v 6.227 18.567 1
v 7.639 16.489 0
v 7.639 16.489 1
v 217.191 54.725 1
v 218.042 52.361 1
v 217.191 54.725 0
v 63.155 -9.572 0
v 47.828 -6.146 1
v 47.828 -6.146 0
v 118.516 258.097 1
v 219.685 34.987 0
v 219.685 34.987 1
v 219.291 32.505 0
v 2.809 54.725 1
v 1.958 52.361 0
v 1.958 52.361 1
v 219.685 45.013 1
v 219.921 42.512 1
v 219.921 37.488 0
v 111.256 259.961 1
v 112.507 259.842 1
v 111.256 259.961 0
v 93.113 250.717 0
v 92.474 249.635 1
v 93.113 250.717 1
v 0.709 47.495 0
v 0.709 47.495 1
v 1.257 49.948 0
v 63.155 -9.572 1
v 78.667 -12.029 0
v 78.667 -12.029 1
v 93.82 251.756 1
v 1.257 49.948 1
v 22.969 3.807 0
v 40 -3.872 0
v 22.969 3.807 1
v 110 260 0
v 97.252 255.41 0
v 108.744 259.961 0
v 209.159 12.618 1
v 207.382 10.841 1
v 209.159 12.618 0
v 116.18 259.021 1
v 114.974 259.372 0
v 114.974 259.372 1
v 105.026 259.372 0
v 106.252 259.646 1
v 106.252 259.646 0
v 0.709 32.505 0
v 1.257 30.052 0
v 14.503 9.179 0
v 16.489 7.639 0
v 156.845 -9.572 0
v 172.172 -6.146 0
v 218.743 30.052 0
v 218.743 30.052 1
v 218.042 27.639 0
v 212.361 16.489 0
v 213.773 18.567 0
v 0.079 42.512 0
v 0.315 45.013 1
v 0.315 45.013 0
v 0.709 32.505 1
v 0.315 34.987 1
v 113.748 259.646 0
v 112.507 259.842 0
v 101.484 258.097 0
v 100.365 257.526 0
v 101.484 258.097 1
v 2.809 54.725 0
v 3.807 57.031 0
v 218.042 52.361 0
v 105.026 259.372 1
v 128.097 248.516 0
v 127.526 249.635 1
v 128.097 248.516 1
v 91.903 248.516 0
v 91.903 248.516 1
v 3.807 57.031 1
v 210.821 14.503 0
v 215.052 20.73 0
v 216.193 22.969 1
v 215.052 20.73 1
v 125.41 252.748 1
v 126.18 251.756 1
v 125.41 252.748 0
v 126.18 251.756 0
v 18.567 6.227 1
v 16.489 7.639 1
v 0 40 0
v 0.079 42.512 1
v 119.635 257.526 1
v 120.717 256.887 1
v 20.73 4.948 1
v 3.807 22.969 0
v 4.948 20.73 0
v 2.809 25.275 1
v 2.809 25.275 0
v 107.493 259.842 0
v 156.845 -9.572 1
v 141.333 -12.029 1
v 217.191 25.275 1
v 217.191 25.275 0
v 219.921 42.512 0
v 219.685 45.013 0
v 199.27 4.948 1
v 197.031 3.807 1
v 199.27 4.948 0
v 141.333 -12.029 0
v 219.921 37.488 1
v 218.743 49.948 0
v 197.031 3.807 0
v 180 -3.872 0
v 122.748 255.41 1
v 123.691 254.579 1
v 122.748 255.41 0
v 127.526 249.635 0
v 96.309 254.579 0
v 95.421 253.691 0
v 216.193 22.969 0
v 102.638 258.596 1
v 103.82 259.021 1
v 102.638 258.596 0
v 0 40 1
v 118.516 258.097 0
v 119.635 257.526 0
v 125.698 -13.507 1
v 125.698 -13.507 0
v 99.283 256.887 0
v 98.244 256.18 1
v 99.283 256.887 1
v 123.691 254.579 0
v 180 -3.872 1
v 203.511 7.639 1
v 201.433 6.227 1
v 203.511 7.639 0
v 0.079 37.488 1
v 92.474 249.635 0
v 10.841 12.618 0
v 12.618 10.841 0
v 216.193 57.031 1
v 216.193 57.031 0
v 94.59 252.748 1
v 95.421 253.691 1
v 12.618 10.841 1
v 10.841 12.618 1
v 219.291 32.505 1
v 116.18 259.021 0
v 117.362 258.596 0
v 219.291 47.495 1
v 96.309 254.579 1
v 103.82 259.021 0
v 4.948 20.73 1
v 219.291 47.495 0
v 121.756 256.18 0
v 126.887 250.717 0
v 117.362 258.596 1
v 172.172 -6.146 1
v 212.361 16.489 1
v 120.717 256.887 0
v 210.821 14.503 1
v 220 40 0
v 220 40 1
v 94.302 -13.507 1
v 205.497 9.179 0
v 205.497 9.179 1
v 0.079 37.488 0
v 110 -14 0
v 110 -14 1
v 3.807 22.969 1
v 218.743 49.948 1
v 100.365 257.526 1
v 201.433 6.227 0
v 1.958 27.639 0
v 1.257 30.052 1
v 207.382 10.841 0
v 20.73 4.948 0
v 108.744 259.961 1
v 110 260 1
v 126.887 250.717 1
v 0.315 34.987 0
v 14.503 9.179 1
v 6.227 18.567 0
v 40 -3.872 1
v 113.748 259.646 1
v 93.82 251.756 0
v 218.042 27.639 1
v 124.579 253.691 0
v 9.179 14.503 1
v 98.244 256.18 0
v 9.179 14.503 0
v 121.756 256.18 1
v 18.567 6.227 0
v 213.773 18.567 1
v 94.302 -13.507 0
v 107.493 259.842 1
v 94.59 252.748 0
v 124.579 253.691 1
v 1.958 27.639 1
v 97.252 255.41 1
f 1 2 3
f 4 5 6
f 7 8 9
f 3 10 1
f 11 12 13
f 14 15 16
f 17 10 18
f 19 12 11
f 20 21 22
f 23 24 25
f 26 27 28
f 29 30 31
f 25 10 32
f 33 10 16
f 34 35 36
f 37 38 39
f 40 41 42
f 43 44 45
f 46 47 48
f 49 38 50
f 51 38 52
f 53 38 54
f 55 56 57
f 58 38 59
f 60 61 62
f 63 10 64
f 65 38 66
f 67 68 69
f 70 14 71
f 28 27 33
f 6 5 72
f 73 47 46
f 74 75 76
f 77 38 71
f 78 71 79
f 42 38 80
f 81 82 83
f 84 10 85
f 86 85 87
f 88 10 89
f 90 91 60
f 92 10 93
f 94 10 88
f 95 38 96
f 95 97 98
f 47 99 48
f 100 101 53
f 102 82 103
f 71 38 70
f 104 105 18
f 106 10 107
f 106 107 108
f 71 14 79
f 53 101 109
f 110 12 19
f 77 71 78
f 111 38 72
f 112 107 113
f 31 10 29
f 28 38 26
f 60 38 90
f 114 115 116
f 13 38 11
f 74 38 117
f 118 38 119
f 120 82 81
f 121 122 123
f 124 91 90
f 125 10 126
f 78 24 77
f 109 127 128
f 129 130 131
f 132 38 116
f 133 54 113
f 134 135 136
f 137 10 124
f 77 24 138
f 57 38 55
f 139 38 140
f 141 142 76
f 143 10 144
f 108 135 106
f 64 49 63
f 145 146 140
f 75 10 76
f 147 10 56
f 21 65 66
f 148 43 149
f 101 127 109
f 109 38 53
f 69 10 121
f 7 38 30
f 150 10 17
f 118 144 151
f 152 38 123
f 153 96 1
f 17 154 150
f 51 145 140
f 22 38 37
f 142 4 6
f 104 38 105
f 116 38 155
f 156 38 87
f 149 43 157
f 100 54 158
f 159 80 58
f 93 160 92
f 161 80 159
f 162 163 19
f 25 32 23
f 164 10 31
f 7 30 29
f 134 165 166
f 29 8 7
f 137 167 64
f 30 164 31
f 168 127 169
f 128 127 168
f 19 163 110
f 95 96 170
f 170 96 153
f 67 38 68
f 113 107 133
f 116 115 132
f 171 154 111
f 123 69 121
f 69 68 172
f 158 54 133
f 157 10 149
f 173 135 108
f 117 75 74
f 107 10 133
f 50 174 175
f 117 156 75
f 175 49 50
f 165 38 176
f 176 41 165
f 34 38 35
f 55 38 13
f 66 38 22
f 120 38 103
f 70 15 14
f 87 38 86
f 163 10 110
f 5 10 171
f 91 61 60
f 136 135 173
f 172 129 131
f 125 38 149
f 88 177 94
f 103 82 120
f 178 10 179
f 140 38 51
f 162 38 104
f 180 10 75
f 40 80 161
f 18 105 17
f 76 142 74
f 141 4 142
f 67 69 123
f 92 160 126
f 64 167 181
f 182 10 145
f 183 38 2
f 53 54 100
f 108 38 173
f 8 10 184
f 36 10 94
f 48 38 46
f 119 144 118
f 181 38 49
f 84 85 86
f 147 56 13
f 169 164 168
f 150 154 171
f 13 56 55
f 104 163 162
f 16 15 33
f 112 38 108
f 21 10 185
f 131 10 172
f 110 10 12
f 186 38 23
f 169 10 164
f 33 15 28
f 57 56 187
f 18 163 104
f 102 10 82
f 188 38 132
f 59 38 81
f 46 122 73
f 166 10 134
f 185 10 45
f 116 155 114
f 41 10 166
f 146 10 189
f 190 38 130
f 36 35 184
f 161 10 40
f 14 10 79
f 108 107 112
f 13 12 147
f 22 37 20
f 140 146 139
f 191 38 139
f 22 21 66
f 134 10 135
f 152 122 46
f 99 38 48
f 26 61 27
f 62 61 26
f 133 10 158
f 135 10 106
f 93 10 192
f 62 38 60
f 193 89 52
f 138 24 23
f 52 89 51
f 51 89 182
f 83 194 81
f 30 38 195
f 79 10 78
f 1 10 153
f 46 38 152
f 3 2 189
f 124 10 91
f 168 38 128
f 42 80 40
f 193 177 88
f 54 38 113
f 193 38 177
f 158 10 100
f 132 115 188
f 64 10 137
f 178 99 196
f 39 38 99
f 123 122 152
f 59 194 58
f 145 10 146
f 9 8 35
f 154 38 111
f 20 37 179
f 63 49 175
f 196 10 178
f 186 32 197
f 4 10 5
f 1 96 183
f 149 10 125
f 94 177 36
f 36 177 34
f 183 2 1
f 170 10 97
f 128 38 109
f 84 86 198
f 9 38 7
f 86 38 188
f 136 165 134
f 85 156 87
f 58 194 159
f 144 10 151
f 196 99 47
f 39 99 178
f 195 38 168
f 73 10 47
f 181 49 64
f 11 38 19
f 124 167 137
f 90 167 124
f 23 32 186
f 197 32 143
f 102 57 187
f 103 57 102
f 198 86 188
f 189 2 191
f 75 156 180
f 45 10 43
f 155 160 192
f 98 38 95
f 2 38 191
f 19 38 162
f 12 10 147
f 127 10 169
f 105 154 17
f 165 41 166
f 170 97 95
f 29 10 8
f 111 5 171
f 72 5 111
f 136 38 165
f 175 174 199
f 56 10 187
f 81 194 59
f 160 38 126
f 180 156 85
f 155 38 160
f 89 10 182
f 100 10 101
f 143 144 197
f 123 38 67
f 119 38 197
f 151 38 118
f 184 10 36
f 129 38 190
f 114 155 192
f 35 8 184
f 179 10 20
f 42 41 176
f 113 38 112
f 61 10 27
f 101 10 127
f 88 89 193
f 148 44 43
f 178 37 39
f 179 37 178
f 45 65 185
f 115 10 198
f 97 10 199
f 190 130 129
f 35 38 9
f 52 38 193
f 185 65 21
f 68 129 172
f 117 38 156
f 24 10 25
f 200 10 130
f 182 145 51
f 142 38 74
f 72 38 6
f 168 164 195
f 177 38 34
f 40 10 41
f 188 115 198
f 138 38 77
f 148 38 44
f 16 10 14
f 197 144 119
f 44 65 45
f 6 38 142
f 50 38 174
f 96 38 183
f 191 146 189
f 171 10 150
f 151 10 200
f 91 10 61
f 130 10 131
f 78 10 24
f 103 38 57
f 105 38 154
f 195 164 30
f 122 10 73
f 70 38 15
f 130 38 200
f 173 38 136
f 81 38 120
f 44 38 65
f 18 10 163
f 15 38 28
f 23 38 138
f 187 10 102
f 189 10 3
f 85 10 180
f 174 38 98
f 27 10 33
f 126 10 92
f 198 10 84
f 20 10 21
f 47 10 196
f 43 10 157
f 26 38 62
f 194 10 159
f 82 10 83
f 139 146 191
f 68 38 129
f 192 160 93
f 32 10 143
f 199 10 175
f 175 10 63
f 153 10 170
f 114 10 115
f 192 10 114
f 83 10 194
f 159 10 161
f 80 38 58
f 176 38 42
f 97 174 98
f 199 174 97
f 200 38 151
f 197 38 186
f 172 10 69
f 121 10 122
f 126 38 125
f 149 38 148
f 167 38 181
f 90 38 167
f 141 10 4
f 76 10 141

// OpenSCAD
// preview[view:south, tilt:top]

/* [Main] */

//how wide to make the guitar pick
base = 220;

//how tall to make the guitar pick
height = 300;

//how thick to make the guitar pick
thickness = 1;

//how rounded to make the corners
radii = [40, 40, 20];

//how curved to make the base (0 is straight)
curve = 250;

//adjusts how close the curve is to the center of the pick
curve_offset = 14;

//how smooth to render all circles
smooth = 100;

module pick(base, height, t, r, curve, co) {
  r0 = max(radii[0], 0.01);
  r1 = max(radii[1], 0.01);
  r2 = max(radii[2], 0.01);

  lw = r0 + r1;
  lh = r2 + max(r0, r1);

  hull()
  {
    translate([r0, r0, 0]) {
      cylinder(r=r0, h=t, $fn=smooth);
    }

    translate([base-r1, r1, 0]) {
      cylinder(r=r1, h=t, $fn=smooth);
    }

    translate([(base-r1+r0)/2, height-lh, 0]) {
      cylinder(r=r2, h=t, $fn=smooth);
    }

    if (curve > 0) {
translate([base/2, curve-co, 0])
difference() {
  rotate_extrude($fn=smooth)
    translate([curve-.01, 0, 0])
      square([.01, t]);
  translate([base/2-lw/2, -curve, -1])
    cube([curve, curve*2, t+1]);
  translate([-curve, 0, -1])
    cube([curve*2, curve, t+1]);
  translate([-curve-(base/2-lw/2), -curve, -1])
    cube([curve, curve, t+1]);
}
    }
  }
}

pick(base, height, thickness, radii, curve, curve_offset);
